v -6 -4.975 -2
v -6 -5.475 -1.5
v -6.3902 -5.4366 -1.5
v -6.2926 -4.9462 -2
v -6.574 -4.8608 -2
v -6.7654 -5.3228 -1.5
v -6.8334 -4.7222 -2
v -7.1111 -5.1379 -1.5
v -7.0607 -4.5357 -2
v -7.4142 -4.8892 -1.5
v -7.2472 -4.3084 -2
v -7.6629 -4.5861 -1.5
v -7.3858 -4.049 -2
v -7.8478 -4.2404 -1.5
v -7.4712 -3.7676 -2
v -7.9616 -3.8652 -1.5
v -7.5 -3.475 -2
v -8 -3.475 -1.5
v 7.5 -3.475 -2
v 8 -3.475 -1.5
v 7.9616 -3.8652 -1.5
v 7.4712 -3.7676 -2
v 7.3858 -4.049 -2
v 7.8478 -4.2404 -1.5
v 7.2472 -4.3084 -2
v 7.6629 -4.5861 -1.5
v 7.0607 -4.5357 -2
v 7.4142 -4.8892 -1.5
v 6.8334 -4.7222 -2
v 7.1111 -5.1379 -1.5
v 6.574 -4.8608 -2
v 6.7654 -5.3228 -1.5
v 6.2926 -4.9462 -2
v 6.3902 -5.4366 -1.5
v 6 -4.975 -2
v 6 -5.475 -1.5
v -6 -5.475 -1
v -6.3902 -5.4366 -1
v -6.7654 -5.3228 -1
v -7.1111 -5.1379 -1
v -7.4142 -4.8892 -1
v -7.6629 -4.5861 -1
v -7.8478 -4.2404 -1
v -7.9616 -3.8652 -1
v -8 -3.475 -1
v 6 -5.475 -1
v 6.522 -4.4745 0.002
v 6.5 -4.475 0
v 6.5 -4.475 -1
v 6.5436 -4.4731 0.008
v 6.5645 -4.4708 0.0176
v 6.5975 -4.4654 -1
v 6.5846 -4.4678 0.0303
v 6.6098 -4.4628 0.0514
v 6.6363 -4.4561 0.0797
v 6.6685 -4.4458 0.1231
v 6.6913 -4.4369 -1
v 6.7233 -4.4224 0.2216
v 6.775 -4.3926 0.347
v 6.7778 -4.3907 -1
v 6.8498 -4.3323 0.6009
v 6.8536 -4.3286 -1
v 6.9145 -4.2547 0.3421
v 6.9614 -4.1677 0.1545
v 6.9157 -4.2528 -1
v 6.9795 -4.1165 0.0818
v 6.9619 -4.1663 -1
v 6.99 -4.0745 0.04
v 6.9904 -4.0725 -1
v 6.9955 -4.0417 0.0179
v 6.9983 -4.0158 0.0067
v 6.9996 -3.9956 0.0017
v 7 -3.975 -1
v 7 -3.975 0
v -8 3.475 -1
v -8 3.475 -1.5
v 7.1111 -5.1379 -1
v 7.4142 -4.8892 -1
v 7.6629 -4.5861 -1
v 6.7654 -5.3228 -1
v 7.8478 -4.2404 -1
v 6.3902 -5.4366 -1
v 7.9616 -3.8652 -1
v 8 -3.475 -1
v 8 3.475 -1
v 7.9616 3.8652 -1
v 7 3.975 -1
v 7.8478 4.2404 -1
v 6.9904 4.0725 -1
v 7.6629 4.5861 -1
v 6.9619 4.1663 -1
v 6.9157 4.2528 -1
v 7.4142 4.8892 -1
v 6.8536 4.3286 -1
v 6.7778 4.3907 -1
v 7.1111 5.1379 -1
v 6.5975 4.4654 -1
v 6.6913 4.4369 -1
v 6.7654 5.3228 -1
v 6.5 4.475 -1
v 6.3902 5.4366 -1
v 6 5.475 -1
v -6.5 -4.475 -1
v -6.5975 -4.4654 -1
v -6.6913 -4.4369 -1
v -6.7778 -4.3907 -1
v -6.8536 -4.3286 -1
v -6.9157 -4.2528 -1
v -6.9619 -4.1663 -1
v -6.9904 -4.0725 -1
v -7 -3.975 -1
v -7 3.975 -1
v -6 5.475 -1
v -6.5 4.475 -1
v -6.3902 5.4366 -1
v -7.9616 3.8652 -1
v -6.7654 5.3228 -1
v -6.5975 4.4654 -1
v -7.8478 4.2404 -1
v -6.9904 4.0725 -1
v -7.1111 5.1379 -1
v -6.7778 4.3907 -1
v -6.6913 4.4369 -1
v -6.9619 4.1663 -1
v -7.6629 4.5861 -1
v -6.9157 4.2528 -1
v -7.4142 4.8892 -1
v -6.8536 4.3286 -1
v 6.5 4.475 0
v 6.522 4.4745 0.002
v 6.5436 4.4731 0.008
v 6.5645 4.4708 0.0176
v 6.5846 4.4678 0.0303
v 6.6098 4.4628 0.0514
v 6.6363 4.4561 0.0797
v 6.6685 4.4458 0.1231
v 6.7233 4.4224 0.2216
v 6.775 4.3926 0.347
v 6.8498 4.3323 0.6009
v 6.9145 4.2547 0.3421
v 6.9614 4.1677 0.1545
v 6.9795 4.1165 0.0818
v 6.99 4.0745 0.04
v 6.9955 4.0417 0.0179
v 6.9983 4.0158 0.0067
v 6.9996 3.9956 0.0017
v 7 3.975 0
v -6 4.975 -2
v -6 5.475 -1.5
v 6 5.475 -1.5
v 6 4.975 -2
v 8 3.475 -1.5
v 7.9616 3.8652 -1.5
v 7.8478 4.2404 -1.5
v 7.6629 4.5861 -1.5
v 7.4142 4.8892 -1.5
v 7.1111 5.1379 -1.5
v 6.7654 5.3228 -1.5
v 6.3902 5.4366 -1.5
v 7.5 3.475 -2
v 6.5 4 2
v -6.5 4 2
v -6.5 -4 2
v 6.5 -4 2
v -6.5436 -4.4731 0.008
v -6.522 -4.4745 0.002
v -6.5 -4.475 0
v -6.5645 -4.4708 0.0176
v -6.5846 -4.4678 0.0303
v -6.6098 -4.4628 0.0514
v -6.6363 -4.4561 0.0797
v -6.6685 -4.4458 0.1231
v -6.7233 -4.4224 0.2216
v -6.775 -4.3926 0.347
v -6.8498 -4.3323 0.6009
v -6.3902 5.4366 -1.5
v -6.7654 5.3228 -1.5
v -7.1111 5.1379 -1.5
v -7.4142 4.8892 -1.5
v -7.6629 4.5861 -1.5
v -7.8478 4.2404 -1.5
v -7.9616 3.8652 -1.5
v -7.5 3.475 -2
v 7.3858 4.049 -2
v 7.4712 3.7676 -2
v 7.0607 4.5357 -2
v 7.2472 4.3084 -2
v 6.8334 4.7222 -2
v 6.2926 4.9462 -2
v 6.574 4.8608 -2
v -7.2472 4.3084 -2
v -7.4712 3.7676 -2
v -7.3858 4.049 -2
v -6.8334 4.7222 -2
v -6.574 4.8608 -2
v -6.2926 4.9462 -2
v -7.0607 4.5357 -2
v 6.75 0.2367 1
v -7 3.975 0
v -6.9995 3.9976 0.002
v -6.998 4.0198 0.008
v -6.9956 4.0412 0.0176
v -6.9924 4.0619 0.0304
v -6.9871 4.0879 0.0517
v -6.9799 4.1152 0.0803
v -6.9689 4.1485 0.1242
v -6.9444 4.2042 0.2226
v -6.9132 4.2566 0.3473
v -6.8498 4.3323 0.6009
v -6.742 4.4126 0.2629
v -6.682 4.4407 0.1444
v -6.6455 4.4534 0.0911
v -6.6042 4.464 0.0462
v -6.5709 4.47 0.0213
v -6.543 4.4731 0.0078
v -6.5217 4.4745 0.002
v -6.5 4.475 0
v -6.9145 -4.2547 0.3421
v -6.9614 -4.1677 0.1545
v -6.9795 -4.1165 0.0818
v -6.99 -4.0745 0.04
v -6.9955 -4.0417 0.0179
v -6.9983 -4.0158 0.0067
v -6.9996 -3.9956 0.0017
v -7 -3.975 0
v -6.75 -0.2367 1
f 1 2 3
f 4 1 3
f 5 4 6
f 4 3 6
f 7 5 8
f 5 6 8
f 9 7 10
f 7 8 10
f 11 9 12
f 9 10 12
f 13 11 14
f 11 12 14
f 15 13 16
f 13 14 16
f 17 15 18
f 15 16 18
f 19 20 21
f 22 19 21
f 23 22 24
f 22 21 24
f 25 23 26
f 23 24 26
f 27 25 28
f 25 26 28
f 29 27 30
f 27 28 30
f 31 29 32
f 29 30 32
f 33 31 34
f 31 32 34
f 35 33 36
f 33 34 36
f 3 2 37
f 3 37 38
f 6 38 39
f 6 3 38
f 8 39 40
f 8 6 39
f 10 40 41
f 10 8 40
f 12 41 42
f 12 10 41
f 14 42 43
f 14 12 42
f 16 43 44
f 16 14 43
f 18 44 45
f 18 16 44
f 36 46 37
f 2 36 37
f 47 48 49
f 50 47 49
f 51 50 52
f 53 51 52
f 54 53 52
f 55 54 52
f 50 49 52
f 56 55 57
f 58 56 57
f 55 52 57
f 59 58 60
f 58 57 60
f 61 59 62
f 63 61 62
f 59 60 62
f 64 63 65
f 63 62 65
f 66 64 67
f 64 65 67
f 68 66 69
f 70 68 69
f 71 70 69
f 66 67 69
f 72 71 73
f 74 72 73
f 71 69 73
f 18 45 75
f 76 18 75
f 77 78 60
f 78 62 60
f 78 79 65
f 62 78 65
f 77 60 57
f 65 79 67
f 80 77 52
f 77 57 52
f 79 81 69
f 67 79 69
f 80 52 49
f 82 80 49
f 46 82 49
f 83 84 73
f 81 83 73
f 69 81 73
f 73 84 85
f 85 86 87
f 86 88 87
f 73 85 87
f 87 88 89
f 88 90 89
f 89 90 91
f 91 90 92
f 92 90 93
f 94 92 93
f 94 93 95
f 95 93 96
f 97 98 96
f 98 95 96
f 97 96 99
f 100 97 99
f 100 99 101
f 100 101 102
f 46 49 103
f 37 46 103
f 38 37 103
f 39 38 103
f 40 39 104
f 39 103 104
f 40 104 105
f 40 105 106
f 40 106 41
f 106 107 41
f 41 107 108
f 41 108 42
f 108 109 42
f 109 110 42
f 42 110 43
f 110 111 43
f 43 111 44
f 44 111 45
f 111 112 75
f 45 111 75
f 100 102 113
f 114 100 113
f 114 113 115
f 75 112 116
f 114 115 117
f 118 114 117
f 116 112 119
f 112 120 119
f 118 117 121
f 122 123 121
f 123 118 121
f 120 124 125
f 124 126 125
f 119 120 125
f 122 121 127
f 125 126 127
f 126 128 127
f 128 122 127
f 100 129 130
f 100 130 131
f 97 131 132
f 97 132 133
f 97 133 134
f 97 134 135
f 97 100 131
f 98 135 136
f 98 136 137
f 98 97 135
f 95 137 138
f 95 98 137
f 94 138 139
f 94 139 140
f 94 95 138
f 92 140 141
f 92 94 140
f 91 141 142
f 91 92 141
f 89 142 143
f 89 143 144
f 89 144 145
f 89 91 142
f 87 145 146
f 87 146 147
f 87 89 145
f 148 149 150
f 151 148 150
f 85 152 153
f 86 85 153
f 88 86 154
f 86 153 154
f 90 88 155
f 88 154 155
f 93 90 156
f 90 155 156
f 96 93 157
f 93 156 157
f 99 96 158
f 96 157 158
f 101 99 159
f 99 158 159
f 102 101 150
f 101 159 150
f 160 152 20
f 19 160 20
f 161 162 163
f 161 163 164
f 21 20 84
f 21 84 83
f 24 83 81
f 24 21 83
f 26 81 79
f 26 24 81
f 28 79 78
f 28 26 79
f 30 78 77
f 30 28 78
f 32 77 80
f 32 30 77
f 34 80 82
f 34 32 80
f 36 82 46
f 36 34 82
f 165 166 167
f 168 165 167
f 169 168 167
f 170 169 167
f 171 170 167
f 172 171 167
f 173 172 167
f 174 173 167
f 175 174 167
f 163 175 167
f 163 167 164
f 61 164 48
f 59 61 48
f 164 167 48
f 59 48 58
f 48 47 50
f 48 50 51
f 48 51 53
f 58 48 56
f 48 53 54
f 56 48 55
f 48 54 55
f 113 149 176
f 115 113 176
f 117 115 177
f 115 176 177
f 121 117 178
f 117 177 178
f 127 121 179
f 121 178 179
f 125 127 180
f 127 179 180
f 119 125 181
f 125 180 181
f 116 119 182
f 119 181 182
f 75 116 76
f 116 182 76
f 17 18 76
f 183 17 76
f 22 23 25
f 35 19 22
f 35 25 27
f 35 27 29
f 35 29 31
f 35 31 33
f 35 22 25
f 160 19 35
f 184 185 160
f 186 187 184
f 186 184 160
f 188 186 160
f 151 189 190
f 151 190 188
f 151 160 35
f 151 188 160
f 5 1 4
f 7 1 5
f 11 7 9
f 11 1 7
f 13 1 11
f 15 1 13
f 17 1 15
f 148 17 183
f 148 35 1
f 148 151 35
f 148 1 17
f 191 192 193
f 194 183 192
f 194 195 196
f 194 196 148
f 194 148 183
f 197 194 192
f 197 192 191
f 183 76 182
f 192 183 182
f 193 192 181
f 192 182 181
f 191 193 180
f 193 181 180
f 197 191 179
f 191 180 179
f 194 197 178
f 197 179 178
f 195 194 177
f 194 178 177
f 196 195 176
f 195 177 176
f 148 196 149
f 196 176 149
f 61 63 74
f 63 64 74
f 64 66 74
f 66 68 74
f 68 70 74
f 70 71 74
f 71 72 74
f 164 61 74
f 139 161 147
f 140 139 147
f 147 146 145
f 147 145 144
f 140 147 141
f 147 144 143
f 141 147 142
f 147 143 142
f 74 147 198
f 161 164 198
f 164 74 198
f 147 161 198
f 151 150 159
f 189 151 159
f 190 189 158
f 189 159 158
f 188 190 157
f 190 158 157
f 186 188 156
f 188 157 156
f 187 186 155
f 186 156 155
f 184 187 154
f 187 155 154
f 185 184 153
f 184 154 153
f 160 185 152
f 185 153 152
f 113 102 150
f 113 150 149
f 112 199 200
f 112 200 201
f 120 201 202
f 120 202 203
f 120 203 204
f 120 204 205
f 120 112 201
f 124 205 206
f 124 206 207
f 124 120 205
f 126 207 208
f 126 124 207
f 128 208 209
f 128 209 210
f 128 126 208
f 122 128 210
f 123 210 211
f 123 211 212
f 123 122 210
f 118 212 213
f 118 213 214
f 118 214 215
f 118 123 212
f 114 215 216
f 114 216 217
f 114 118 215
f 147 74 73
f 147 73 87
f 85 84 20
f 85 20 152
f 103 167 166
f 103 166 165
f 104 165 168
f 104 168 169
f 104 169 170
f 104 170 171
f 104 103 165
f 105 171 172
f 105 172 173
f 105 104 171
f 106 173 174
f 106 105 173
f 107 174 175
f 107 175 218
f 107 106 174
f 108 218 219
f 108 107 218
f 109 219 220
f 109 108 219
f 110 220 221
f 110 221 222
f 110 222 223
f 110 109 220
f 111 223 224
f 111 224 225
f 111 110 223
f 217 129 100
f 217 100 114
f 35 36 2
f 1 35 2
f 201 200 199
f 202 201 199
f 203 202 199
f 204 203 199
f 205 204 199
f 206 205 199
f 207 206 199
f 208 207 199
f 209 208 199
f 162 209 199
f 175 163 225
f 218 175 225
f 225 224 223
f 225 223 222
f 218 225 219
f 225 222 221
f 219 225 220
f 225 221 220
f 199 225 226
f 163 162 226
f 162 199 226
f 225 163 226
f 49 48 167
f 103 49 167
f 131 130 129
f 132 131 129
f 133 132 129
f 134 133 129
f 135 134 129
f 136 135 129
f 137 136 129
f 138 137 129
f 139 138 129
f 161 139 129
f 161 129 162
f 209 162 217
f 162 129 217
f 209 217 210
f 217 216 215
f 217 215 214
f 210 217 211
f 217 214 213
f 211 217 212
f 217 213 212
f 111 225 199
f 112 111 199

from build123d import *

# Parameters (mm, degrees)
SKETCH2_W           = 13
SKETCH2_H           = 8
SKETCH1_W           = 14
SKETCH1_H           = 8.95
SKETCH3_W           = 14
SKETCH3_H           = 8.95
BOSS_EXTRUDE1_DEPTH = 1
SKETCH4_W           = 16
SKETCH4_H           = 10.95
BOSS_EXTRUDE2_DEPTH = 1
FILLET1_R           = 2
CHAMFER1_SIZE       = 0.5
FILLET2_R           = 0.5


with BuildPart() as part:
    # Sketch2 → Loft1 section 0
    with BuildSketch(Plane.XY.offset(2)):
        Rectangle(SKETCH2_W, SKETCH2_H)
    # Sketch1 → Loft1 section 1
    with BuildSketch(Plane.XY):
        Rectangle(SKETCH1_W, SKETCH1_H)
    loft()

    # Sketch3 → Boss-Extrude1 (add)
    with BuildSketch(Plane(origin=(0, 0, 0), x_dir=(-1, 0, 0), z_dir=(0, 0, -1))):
        Rectangle(SKETCH3_W, SKETCH3_H)
    extrude(amount=BOSS_EXTRUDE1_DEPTH)

    # Sketch4 → Boss-Extrude2 (add)
    with BuildSketch(Plane(origin=(0, 0, -1), x_dir=(-1, 0, 0), z_dir=(0, 0, -1))):
        Rectangle(SKETCH4_W, SKETCH4_H)
    extrude(amount=BOSS_EXTRUDE2_DEPTH)

    # Fillet1
    fillet1_edges = [part.edges().sort_by_distance(p)[0] for p in [
        (-8, -5.475, -1.5),
        (-8, 5.475, -1.5),
        (8, 5.475, -1.5),
        (8, -5.475, -1.5),
    ]]
    fillet(fillet1_edges, radius=FILLET1_R)

    # Chamfer1
    chamfer1_edges = [part.edges().sort_by_distance(p)[0] for p in [
        (-8, 0, -2),
        (0, -5.475, -2),
        (0, 5.475, -2),
        (8, 0, -2),
        (7.414213562, 4.889213562, -2),
        (7.414213562, -4.889213562, -2),
        (-7.414213562, 4.889213562, -2),
        (-7.414213562, -4.889213562, -2),
    ]]
    chamfer(chamfer1_edges, length=CHAMFER1_SIZE)

    # Fillet2
    fillet2_edges = [part.edges().sort_by_distance(p)[0] for p in [
        (-7, -4.475, -0.5),
        (-7, 4.475, -0.5),
        (7, -4.475, -0.5),
        (7, 4.475, -0.5),
    ]]
    fillet(fillet2_edges, radius=FILLET2_R)


solid = part.part
